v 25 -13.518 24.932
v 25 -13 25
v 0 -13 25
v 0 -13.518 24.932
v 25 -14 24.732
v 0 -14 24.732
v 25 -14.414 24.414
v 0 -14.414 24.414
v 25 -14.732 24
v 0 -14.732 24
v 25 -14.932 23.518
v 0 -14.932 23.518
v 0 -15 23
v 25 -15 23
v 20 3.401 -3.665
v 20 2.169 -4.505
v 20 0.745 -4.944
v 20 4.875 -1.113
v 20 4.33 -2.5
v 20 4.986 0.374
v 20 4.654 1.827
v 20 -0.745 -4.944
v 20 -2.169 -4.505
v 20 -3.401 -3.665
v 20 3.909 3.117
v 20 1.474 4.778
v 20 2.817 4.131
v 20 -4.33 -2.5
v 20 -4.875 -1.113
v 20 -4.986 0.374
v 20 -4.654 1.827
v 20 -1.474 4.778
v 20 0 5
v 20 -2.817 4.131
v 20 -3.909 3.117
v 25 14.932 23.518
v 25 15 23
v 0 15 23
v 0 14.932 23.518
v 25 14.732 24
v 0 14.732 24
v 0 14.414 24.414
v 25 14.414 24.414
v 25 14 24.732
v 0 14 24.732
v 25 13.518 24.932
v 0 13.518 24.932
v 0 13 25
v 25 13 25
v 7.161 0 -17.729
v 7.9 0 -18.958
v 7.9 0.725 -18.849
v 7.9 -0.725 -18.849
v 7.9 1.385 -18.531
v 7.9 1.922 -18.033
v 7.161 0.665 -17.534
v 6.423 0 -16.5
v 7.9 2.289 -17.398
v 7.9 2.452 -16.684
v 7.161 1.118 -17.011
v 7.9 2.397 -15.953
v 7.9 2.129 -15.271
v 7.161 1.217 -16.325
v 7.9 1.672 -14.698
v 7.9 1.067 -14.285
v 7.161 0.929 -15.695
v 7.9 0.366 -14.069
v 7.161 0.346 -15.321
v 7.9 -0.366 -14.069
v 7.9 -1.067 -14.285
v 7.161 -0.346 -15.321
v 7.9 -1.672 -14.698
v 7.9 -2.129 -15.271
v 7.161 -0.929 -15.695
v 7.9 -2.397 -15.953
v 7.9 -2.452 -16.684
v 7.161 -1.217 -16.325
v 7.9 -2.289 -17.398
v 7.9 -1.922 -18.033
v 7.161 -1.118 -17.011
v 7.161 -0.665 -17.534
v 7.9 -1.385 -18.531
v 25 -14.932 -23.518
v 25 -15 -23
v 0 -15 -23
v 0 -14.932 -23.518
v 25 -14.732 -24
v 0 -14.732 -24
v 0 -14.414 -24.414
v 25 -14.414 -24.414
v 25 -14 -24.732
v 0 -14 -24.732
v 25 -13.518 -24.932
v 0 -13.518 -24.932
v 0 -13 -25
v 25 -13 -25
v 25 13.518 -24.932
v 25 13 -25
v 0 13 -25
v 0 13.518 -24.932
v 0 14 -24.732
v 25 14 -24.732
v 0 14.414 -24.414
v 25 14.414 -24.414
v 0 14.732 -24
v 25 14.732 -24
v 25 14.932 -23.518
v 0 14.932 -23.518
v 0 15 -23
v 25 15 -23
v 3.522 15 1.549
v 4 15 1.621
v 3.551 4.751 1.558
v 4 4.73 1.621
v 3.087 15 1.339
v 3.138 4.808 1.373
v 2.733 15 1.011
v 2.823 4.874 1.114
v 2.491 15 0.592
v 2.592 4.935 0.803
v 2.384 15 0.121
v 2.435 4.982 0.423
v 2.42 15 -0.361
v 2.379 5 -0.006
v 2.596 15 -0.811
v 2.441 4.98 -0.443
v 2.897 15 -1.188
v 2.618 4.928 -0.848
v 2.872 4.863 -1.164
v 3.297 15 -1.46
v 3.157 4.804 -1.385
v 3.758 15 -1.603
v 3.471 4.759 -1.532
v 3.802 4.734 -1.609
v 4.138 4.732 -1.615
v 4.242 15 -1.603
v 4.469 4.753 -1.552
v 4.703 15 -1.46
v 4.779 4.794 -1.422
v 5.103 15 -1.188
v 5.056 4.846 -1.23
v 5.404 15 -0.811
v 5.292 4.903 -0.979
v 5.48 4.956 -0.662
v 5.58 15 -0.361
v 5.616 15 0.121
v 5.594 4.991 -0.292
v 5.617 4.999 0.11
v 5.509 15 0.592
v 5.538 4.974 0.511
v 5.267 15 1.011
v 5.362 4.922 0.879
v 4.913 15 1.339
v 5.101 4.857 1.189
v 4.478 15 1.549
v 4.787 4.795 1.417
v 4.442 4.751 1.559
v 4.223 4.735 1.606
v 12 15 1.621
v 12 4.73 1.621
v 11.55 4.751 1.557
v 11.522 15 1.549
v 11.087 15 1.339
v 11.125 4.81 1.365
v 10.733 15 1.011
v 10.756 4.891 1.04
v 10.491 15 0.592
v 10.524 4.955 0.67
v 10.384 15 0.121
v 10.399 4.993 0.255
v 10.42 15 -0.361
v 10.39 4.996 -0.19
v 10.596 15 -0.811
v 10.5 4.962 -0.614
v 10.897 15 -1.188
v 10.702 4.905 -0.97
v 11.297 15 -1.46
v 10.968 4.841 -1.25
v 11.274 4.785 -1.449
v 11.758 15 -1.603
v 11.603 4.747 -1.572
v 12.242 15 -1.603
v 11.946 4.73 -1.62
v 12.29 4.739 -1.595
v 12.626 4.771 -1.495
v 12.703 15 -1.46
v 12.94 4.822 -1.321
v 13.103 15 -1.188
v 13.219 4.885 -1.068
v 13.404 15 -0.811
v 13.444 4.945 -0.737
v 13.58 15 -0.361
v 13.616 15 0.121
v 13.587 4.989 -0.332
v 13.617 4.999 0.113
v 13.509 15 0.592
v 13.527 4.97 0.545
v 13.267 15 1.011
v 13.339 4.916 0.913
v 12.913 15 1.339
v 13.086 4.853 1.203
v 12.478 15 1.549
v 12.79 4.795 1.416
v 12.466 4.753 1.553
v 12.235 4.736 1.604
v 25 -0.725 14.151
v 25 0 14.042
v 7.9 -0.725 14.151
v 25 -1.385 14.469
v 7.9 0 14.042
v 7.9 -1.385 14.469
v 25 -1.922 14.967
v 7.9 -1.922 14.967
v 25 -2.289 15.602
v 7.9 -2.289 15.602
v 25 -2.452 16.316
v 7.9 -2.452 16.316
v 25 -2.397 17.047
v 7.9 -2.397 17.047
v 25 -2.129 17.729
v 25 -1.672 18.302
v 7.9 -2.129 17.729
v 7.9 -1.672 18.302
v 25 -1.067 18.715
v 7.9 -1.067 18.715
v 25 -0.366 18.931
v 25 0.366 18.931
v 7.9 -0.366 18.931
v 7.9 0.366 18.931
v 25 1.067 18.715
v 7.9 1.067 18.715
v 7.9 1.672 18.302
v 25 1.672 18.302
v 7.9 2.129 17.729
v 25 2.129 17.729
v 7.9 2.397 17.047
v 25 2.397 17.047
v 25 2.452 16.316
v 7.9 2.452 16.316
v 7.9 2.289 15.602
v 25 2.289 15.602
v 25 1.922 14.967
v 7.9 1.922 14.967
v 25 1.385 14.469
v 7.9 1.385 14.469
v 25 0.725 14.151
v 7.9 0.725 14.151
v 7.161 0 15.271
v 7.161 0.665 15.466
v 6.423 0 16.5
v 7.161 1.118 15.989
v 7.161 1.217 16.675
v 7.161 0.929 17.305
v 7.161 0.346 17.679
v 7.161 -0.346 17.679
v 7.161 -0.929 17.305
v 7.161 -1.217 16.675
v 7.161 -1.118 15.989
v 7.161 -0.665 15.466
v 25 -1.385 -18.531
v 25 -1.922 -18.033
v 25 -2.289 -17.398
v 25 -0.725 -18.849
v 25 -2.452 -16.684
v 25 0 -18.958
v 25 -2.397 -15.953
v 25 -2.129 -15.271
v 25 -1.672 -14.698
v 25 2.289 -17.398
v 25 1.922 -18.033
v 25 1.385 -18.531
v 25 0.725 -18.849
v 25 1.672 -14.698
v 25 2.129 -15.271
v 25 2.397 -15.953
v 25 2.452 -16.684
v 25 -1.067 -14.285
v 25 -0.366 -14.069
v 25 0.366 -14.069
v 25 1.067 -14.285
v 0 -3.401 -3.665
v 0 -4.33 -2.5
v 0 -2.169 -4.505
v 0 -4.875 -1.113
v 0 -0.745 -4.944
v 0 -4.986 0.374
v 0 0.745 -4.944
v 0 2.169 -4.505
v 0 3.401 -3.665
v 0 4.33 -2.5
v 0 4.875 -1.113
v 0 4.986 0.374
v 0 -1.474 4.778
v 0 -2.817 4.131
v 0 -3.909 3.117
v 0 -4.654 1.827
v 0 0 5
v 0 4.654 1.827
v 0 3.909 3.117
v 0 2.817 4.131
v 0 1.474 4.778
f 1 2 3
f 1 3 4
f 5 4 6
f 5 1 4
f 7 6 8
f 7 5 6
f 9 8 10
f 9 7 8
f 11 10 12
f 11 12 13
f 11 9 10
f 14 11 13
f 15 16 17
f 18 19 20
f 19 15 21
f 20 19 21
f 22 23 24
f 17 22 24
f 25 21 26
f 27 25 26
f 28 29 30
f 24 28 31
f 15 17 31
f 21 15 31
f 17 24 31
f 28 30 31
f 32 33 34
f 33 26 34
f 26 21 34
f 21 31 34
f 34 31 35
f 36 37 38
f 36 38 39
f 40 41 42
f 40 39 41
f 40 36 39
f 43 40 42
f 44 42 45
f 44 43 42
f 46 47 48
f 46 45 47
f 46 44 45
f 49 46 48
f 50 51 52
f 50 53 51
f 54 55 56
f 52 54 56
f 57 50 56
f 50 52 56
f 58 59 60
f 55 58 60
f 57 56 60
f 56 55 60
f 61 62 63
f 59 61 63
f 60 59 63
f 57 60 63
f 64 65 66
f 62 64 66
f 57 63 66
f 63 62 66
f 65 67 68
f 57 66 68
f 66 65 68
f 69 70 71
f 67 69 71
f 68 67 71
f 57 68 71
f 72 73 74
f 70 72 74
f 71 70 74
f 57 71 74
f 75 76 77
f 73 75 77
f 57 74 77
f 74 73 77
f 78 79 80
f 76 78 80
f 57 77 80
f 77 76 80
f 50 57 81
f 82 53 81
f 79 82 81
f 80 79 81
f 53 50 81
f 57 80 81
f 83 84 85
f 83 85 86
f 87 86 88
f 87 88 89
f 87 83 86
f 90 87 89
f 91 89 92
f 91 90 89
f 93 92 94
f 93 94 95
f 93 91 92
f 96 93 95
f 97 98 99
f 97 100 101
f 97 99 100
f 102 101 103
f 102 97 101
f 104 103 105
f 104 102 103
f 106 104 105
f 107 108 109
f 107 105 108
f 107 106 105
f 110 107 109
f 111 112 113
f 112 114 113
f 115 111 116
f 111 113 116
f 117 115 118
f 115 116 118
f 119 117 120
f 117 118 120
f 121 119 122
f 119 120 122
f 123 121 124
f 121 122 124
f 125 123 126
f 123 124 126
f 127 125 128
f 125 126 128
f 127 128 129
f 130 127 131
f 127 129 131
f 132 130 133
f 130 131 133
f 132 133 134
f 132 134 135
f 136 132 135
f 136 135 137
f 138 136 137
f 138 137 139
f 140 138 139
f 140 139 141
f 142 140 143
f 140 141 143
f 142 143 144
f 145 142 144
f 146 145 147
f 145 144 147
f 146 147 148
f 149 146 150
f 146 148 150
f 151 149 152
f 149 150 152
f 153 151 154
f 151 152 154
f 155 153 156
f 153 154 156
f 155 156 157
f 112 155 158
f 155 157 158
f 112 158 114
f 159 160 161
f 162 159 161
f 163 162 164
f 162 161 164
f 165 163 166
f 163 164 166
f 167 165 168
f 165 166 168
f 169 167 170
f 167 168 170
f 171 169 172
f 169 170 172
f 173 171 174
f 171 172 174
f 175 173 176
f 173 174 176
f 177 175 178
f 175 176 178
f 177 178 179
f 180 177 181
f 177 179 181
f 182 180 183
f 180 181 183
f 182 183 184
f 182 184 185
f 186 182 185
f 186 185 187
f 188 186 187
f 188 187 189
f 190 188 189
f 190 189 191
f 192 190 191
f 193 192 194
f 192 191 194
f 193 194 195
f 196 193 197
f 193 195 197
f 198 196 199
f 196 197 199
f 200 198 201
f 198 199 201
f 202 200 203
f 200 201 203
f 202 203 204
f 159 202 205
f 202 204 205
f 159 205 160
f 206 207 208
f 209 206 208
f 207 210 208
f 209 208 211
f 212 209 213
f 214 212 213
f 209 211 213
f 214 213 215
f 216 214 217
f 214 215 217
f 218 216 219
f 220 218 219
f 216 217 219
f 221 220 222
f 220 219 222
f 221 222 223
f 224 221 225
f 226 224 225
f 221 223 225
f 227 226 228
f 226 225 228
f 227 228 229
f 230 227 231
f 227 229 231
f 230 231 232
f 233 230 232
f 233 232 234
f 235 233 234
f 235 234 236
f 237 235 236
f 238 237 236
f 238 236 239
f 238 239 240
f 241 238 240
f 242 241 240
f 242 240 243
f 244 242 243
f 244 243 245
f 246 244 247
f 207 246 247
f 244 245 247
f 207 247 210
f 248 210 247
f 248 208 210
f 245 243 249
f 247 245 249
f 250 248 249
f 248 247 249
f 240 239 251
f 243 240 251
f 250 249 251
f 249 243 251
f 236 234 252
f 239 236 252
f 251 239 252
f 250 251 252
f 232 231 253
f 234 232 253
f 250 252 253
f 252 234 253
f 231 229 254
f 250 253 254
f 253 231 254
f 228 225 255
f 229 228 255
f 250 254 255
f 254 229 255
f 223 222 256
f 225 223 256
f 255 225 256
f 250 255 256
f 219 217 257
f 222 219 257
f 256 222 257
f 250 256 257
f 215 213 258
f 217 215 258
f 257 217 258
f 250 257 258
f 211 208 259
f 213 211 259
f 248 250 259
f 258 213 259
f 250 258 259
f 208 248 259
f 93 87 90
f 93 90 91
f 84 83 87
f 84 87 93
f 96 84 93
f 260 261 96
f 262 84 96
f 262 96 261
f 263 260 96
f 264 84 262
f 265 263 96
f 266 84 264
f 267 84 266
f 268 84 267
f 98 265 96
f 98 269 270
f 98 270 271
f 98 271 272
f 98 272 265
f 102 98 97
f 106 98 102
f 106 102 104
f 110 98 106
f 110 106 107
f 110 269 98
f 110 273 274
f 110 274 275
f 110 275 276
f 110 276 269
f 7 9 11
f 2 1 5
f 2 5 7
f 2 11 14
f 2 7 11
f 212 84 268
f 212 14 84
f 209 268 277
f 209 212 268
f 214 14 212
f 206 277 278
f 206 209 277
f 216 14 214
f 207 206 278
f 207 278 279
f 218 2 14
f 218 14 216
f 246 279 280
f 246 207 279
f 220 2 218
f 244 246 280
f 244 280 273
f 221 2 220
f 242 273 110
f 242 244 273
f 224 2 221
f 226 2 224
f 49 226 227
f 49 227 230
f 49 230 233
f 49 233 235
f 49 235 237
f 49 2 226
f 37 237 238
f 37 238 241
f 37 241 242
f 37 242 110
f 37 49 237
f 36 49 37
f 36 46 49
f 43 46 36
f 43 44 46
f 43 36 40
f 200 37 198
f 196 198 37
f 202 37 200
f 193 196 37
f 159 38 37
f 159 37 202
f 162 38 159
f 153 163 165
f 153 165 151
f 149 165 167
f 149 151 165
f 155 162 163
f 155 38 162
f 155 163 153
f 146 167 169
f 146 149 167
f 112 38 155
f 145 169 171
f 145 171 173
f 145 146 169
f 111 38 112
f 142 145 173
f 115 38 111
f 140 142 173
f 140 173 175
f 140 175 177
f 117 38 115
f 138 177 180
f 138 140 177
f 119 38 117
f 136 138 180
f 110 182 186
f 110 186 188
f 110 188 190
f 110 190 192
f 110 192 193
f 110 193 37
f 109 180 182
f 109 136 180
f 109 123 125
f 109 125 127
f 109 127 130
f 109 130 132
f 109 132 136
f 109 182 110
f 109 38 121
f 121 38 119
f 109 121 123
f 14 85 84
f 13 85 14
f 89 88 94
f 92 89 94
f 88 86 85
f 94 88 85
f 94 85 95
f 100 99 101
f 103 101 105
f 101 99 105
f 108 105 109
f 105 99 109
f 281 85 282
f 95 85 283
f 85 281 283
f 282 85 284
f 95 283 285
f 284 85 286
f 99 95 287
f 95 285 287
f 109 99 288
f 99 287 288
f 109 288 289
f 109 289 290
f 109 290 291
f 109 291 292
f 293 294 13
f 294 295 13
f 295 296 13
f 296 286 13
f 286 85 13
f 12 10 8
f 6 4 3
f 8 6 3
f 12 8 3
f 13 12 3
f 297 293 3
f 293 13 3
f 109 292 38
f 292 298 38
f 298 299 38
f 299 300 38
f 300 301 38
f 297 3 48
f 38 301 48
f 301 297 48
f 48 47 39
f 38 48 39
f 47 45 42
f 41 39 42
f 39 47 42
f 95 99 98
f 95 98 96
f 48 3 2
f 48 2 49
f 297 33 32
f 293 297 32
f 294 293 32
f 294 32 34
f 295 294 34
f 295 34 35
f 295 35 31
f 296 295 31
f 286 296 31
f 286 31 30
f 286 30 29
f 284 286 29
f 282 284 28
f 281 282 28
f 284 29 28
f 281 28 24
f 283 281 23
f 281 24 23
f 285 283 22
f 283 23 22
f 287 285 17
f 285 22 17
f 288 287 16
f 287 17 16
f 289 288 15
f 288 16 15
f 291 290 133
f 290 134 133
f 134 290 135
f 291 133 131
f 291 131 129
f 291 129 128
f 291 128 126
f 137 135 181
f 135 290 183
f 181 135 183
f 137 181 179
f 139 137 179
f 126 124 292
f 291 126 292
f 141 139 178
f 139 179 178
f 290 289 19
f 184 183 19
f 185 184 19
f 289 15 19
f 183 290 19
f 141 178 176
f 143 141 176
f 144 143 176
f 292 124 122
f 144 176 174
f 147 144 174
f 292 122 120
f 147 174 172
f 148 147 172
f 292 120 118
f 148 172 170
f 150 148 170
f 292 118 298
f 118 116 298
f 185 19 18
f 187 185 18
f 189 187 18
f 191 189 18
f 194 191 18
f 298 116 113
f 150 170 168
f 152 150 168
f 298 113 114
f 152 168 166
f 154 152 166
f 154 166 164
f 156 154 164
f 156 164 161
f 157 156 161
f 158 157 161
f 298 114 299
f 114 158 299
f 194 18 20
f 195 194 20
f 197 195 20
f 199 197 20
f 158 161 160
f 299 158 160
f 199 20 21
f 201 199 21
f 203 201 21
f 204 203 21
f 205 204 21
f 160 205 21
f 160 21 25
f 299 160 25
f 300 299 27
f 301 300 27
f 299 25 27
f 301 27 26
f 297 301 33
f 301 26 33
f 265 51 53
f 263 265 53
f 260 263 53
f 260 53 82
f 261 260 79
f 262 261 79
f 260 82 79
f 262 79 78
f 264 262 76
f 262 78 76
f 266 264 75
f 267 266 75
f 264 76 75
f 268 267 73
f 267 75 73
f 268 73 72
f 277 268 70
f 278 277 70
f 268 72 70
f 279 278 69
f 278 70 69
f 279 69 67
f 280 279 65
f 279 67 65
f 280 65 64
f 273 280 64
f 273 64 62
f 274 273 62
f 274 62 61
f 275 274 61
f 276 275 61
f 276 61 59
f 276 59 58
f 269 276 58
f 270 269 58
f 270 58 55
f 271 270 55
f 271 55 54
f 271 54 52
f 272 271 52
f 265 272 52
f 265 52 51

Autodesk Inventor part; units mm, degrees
ref_plane "YZ Plane" through (0, 0, 0) normal (1, 0, 0) x (0, 1, 0)
ref_plane "XZ Plane" through (0, 0, 0) normal (0, 1, 0) x (-1, 0, 0)
ref_plane "XY Plane" through (0, 0, 0) normal (0, 0, 1) x (1, 0, 0)
sketch "Sketch1" plane through (0, 0, 0) normal (1, 0, 0) x (0, 1, 0)
  line L0 (-15, 25) -> (15, 25)
  line L1 (15, 25) -> (15, -25)
  line L2 (15, -25) -> (-15, -25)
  line L3 (-15, -25) -> (-15, 25)
  line L4 (-15, 25) -> (15, -25) construction
  line L5 (15, 25) -> (-15, -25) construction
  point P0 (0, 0)
  dimension "d1" = 50
  dimension "d2" = 30
extrude "Extrusion1" add sketch "Sketch1" along normal blind 25
hole "Hole1" at (0, 0, 0) direction (1, 0, 0) diameter 10 depth 20
sketch "Sketch2" plane through (0, 15, 25) normal (0, 1, 0) x (1, 0, 0)
  line L0 (0, 25) -> (25, 25) construction
  line L1 (25, 50) -> (25, 0) construction
  line L2 (0, 50) -> (0, 0) construction
  point P0 (4, 25)
  point P1 (12, 25)
  dimension "d12" = 4
  dimension "d13" = 12
hole "Hole2" at (4, 15, 0) at (12, 15, 0) direction (0, -1, 0) diameter 3.242 end up to surface thread size "M4x0.7" class "6H" standard "ISO Metric profile"
sketch "Sketch3" plane through (25, 0, 0) normal (1, 0, 0) x (0, 0, -1)
  line L0 (-16.5, 0) -> (0, 0) construction
  line L1 (0, 0) -> (16.5, 0) construction
  dimension "d21" = 33
hole "Hole3" at (25, 0, 16.5) at (25, 0, -16.5) direction (-1, 0, 0) diameter 4.917 depth 17.1 tip angle 118 thread size "M6x1" class "6H" standard "ISO Metric profile"
fillet "Fillet1" radius 2 4 edges at (12.5, 15, -25) (12.5, -15, -25) (12.5, -15, 25) (12.5, 15, 25)
properties part number "axle_tube_mount_10mm" material "Steel, Alloy"
